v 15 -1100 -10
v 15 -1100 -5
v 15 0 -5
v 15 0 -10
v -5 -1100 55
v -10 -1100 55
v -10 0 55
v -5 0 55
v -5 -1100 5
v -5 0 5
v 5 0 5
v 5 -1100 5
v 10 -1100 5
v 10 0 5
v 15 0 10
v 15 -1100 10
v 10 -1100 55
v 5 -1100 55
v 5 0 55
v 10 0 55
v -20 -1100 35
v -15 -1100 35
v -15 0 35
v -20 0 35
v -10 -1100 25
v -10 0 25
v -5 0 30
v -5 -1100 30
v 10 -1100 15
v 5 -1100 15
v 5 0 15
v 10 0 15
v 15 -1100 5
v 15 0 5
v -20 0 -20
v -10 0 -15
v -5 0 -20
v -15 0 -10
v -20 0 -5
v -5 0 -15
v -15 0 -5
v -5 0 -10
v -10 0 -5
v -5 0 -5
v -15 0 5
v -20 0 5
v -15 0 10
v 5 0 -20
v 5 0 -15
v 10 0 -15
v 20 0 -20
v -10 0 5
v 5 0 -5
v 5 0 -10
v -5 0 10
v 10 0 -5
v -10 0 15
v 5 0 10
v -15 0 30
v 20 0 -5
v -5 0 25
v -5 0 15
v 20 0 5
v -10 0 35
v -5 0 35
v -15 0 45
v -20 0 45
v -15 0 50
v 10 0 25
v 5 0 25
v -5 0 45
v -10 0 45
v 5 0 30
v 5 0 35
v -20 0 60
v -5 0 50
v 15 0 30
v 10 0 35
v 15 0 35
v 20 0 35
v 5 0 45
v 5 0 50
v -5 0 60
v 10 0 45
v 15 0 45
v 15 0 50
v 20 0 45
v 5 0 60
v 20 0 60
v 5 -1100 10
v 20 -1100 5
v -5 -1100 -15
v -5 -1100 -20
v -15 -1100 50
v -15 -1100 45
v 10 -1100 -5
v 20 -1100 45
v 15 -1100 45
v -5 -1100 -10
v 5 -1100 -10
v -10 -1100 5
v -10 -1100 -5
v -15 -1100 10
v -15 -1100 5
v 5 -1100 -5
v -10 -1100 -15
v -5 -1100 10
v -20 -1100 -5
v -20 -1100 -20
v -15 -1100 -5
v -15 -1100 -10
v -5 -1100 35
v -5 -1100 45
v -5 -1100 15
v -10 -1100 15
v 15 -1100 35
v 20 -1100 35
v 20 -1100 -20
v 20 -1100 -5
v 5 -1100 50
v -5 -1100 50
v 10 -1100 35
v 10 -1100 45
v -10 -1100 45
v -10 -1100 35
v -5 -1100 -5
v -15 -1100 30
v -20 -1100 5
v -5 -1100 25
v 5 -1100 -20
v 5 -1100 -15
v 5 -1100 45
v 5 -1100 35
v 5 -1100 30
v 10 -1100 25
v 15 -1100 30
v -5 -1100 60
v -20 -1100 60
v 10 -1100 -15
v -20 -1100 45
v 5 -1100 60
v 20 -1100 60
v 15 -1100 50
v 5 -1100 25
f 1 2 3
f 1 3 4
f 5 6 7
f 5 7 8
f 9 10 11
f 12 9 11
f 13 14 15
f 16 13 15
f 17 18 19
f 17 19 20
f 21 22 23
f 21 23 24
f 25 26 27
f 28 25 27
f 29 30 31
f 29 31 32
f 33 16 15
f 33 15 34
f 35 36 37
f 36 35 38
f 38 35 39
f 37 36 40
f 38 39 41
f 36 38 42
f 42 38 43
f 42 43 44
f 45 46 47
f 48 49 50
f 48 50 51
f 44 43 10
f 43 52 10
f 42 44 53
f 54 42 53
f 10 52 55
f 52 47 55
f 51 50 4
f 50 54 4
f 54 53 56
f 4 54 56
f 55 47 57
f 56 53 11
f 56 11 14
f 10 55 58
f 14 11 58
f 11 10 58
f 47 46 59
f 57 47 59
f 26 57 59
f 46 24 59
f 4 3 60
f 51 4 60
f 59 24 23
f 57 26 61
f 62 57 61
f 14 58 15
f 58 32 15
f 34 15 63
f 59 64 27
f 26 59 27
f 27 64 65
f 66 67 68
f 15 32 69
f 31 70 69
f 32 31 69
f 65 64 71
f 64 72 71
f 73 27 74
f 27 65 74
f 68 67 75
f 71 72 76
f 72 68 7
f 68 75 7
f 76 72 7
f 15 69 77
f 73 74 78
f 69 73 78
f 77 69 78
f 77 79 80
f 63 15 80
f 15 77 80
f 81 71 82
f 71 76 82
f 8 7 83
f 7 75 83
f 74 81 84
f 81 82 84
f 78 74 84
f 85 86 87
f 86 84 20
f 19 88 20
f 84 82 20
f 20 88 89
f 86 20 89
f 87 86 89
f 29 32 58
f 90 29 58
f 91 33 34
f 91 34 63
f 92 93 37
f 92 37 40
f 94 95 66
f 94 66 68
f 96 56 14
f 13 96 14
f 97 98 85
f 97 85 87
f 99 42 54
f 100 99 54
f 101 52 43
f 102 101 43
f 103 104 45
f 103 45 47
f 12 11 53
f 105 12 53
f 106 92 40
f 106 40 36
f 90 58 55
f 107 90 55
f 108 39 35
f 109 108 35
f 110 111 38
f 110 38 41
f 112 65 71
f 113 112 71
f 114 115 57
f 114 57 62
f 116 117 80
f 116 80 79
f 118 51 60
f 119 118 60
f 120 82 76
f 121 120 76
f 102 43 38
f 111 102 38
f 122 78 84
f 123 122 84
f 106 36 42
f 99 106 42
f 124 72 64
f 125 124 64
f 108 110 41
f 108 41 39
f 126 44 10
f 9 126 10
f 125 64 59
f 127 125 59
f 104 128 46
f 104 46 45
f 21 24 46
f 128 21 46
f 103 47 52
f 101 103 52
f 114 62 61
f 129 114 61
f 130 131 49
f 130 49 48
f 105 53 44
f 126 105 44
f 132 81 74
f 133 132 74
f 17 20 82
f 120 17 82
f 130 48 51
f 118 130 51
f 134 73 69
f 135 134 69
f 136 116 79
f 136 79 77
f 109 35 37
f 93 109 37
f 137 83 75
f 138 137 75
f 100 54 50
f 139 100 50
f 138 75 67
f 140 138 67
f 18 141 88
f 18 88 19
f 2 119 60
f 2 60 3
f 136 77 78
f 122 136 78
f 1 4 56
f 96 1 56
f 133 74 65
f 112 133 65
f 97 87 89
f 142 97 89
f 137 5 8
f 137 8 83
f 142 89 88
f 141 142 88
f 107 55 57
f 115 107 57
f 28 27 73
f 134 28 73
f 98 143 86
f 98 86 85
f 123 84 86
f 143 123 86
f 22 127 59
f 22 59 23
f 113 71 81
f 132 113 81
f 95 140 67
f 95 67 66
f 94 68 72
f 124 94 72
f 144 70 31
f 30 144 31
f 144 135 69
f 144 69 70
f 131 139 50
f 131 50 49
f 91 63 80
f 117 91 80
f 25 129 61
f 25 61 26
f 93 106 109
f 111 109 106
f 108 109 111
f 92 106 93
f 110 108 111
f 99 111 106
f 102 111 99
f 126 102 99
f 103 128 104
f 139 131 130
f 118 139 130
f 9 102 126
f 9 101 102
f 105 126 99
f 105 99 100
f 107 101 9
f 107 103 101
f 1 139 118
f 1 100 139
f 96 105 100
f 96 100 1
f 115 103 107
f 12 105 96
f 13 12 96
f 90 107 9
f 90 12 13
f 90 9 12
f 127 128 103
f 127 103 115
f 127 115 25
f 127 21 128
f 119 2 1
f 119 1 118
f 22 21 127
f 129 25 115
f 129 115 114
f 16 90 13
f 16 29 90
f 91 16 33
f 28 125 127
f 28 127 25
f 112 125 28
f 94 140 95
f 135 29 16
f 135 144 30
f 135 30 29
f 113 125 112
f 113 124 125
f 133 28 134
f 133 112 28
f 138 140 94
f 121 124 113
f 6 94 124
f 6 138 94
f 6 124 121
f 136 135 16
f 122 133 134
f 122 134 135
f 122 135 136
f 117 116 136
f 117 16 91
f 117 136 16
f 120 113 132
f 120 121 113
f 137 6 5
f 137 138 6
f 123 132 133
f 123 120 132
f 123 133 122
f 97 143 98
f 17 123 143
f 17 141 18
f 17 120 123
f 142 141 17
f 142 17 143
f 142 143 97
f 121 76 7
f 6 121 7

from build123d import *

# Parameters (mm, degrees)
F1_DEPTH = 1100


with BuildPart() as f1:
    # F0 (on Front) → F1 (new body)
    with BuildSketch(Plane.XZ):
        Polygon((5, -20), (20, -20), (20, -5), (15, -5), (15, -10), (10, -5), (10, 5), (15, 10), (15, 5), (20, 5), (20, 20), (20, 35), (15, 35), (15, 30), (10, 35), (10, 45), (15, 50), (15, 45), (20, 45), (20, 60), (5, 60), (5, 55), (10, 55), (5, 50), (-5, 50), (-10, 55), (-5, 55), (-5, 60), (-20, 60), (-20, 45), (-15, 45), (-15, 50), (-10, 45), (-10, 35), (-15, 30), (-15, 35), (-20, 35), (-20, 20), (-20, 5), (-15, 5), (-15, 10), (-10, 5), (-10, -5), (-15, -10), (-15, -5), (-20, -5), (-20, -20), (-5, -20), (-5, -15), (-10, -15), (-5, -10), (5, -10), (10, -15), (5, -15), align=None)
        Polygon((-5, 0), (-5, 5), (0, 5), (5, 5), (5, 0), (5, -5), (0, -5), (-5, -5), align=None, mode=Mode.SUBTRACT)
        Polygon((-5, 15), (-5, 20), (-5, 25), (-10, 25), (-5, 30), (5, 30), (10, 25), (5, 25), (5, 20), (5, 15), (10, 15), (5, 10), (-5, 10), (-10, 15), align=None, mode=Mode.SUBTRACT)
        Polygon((-5, 40), (-5, 45), (0, 45), (5, 45), (5, 40), (5, 35), (0, 35), (-5, 35), align=None, mode=Mode.SUBTRACT)
    extrude(amount=F1_DEPTH)


solid = f1.part
